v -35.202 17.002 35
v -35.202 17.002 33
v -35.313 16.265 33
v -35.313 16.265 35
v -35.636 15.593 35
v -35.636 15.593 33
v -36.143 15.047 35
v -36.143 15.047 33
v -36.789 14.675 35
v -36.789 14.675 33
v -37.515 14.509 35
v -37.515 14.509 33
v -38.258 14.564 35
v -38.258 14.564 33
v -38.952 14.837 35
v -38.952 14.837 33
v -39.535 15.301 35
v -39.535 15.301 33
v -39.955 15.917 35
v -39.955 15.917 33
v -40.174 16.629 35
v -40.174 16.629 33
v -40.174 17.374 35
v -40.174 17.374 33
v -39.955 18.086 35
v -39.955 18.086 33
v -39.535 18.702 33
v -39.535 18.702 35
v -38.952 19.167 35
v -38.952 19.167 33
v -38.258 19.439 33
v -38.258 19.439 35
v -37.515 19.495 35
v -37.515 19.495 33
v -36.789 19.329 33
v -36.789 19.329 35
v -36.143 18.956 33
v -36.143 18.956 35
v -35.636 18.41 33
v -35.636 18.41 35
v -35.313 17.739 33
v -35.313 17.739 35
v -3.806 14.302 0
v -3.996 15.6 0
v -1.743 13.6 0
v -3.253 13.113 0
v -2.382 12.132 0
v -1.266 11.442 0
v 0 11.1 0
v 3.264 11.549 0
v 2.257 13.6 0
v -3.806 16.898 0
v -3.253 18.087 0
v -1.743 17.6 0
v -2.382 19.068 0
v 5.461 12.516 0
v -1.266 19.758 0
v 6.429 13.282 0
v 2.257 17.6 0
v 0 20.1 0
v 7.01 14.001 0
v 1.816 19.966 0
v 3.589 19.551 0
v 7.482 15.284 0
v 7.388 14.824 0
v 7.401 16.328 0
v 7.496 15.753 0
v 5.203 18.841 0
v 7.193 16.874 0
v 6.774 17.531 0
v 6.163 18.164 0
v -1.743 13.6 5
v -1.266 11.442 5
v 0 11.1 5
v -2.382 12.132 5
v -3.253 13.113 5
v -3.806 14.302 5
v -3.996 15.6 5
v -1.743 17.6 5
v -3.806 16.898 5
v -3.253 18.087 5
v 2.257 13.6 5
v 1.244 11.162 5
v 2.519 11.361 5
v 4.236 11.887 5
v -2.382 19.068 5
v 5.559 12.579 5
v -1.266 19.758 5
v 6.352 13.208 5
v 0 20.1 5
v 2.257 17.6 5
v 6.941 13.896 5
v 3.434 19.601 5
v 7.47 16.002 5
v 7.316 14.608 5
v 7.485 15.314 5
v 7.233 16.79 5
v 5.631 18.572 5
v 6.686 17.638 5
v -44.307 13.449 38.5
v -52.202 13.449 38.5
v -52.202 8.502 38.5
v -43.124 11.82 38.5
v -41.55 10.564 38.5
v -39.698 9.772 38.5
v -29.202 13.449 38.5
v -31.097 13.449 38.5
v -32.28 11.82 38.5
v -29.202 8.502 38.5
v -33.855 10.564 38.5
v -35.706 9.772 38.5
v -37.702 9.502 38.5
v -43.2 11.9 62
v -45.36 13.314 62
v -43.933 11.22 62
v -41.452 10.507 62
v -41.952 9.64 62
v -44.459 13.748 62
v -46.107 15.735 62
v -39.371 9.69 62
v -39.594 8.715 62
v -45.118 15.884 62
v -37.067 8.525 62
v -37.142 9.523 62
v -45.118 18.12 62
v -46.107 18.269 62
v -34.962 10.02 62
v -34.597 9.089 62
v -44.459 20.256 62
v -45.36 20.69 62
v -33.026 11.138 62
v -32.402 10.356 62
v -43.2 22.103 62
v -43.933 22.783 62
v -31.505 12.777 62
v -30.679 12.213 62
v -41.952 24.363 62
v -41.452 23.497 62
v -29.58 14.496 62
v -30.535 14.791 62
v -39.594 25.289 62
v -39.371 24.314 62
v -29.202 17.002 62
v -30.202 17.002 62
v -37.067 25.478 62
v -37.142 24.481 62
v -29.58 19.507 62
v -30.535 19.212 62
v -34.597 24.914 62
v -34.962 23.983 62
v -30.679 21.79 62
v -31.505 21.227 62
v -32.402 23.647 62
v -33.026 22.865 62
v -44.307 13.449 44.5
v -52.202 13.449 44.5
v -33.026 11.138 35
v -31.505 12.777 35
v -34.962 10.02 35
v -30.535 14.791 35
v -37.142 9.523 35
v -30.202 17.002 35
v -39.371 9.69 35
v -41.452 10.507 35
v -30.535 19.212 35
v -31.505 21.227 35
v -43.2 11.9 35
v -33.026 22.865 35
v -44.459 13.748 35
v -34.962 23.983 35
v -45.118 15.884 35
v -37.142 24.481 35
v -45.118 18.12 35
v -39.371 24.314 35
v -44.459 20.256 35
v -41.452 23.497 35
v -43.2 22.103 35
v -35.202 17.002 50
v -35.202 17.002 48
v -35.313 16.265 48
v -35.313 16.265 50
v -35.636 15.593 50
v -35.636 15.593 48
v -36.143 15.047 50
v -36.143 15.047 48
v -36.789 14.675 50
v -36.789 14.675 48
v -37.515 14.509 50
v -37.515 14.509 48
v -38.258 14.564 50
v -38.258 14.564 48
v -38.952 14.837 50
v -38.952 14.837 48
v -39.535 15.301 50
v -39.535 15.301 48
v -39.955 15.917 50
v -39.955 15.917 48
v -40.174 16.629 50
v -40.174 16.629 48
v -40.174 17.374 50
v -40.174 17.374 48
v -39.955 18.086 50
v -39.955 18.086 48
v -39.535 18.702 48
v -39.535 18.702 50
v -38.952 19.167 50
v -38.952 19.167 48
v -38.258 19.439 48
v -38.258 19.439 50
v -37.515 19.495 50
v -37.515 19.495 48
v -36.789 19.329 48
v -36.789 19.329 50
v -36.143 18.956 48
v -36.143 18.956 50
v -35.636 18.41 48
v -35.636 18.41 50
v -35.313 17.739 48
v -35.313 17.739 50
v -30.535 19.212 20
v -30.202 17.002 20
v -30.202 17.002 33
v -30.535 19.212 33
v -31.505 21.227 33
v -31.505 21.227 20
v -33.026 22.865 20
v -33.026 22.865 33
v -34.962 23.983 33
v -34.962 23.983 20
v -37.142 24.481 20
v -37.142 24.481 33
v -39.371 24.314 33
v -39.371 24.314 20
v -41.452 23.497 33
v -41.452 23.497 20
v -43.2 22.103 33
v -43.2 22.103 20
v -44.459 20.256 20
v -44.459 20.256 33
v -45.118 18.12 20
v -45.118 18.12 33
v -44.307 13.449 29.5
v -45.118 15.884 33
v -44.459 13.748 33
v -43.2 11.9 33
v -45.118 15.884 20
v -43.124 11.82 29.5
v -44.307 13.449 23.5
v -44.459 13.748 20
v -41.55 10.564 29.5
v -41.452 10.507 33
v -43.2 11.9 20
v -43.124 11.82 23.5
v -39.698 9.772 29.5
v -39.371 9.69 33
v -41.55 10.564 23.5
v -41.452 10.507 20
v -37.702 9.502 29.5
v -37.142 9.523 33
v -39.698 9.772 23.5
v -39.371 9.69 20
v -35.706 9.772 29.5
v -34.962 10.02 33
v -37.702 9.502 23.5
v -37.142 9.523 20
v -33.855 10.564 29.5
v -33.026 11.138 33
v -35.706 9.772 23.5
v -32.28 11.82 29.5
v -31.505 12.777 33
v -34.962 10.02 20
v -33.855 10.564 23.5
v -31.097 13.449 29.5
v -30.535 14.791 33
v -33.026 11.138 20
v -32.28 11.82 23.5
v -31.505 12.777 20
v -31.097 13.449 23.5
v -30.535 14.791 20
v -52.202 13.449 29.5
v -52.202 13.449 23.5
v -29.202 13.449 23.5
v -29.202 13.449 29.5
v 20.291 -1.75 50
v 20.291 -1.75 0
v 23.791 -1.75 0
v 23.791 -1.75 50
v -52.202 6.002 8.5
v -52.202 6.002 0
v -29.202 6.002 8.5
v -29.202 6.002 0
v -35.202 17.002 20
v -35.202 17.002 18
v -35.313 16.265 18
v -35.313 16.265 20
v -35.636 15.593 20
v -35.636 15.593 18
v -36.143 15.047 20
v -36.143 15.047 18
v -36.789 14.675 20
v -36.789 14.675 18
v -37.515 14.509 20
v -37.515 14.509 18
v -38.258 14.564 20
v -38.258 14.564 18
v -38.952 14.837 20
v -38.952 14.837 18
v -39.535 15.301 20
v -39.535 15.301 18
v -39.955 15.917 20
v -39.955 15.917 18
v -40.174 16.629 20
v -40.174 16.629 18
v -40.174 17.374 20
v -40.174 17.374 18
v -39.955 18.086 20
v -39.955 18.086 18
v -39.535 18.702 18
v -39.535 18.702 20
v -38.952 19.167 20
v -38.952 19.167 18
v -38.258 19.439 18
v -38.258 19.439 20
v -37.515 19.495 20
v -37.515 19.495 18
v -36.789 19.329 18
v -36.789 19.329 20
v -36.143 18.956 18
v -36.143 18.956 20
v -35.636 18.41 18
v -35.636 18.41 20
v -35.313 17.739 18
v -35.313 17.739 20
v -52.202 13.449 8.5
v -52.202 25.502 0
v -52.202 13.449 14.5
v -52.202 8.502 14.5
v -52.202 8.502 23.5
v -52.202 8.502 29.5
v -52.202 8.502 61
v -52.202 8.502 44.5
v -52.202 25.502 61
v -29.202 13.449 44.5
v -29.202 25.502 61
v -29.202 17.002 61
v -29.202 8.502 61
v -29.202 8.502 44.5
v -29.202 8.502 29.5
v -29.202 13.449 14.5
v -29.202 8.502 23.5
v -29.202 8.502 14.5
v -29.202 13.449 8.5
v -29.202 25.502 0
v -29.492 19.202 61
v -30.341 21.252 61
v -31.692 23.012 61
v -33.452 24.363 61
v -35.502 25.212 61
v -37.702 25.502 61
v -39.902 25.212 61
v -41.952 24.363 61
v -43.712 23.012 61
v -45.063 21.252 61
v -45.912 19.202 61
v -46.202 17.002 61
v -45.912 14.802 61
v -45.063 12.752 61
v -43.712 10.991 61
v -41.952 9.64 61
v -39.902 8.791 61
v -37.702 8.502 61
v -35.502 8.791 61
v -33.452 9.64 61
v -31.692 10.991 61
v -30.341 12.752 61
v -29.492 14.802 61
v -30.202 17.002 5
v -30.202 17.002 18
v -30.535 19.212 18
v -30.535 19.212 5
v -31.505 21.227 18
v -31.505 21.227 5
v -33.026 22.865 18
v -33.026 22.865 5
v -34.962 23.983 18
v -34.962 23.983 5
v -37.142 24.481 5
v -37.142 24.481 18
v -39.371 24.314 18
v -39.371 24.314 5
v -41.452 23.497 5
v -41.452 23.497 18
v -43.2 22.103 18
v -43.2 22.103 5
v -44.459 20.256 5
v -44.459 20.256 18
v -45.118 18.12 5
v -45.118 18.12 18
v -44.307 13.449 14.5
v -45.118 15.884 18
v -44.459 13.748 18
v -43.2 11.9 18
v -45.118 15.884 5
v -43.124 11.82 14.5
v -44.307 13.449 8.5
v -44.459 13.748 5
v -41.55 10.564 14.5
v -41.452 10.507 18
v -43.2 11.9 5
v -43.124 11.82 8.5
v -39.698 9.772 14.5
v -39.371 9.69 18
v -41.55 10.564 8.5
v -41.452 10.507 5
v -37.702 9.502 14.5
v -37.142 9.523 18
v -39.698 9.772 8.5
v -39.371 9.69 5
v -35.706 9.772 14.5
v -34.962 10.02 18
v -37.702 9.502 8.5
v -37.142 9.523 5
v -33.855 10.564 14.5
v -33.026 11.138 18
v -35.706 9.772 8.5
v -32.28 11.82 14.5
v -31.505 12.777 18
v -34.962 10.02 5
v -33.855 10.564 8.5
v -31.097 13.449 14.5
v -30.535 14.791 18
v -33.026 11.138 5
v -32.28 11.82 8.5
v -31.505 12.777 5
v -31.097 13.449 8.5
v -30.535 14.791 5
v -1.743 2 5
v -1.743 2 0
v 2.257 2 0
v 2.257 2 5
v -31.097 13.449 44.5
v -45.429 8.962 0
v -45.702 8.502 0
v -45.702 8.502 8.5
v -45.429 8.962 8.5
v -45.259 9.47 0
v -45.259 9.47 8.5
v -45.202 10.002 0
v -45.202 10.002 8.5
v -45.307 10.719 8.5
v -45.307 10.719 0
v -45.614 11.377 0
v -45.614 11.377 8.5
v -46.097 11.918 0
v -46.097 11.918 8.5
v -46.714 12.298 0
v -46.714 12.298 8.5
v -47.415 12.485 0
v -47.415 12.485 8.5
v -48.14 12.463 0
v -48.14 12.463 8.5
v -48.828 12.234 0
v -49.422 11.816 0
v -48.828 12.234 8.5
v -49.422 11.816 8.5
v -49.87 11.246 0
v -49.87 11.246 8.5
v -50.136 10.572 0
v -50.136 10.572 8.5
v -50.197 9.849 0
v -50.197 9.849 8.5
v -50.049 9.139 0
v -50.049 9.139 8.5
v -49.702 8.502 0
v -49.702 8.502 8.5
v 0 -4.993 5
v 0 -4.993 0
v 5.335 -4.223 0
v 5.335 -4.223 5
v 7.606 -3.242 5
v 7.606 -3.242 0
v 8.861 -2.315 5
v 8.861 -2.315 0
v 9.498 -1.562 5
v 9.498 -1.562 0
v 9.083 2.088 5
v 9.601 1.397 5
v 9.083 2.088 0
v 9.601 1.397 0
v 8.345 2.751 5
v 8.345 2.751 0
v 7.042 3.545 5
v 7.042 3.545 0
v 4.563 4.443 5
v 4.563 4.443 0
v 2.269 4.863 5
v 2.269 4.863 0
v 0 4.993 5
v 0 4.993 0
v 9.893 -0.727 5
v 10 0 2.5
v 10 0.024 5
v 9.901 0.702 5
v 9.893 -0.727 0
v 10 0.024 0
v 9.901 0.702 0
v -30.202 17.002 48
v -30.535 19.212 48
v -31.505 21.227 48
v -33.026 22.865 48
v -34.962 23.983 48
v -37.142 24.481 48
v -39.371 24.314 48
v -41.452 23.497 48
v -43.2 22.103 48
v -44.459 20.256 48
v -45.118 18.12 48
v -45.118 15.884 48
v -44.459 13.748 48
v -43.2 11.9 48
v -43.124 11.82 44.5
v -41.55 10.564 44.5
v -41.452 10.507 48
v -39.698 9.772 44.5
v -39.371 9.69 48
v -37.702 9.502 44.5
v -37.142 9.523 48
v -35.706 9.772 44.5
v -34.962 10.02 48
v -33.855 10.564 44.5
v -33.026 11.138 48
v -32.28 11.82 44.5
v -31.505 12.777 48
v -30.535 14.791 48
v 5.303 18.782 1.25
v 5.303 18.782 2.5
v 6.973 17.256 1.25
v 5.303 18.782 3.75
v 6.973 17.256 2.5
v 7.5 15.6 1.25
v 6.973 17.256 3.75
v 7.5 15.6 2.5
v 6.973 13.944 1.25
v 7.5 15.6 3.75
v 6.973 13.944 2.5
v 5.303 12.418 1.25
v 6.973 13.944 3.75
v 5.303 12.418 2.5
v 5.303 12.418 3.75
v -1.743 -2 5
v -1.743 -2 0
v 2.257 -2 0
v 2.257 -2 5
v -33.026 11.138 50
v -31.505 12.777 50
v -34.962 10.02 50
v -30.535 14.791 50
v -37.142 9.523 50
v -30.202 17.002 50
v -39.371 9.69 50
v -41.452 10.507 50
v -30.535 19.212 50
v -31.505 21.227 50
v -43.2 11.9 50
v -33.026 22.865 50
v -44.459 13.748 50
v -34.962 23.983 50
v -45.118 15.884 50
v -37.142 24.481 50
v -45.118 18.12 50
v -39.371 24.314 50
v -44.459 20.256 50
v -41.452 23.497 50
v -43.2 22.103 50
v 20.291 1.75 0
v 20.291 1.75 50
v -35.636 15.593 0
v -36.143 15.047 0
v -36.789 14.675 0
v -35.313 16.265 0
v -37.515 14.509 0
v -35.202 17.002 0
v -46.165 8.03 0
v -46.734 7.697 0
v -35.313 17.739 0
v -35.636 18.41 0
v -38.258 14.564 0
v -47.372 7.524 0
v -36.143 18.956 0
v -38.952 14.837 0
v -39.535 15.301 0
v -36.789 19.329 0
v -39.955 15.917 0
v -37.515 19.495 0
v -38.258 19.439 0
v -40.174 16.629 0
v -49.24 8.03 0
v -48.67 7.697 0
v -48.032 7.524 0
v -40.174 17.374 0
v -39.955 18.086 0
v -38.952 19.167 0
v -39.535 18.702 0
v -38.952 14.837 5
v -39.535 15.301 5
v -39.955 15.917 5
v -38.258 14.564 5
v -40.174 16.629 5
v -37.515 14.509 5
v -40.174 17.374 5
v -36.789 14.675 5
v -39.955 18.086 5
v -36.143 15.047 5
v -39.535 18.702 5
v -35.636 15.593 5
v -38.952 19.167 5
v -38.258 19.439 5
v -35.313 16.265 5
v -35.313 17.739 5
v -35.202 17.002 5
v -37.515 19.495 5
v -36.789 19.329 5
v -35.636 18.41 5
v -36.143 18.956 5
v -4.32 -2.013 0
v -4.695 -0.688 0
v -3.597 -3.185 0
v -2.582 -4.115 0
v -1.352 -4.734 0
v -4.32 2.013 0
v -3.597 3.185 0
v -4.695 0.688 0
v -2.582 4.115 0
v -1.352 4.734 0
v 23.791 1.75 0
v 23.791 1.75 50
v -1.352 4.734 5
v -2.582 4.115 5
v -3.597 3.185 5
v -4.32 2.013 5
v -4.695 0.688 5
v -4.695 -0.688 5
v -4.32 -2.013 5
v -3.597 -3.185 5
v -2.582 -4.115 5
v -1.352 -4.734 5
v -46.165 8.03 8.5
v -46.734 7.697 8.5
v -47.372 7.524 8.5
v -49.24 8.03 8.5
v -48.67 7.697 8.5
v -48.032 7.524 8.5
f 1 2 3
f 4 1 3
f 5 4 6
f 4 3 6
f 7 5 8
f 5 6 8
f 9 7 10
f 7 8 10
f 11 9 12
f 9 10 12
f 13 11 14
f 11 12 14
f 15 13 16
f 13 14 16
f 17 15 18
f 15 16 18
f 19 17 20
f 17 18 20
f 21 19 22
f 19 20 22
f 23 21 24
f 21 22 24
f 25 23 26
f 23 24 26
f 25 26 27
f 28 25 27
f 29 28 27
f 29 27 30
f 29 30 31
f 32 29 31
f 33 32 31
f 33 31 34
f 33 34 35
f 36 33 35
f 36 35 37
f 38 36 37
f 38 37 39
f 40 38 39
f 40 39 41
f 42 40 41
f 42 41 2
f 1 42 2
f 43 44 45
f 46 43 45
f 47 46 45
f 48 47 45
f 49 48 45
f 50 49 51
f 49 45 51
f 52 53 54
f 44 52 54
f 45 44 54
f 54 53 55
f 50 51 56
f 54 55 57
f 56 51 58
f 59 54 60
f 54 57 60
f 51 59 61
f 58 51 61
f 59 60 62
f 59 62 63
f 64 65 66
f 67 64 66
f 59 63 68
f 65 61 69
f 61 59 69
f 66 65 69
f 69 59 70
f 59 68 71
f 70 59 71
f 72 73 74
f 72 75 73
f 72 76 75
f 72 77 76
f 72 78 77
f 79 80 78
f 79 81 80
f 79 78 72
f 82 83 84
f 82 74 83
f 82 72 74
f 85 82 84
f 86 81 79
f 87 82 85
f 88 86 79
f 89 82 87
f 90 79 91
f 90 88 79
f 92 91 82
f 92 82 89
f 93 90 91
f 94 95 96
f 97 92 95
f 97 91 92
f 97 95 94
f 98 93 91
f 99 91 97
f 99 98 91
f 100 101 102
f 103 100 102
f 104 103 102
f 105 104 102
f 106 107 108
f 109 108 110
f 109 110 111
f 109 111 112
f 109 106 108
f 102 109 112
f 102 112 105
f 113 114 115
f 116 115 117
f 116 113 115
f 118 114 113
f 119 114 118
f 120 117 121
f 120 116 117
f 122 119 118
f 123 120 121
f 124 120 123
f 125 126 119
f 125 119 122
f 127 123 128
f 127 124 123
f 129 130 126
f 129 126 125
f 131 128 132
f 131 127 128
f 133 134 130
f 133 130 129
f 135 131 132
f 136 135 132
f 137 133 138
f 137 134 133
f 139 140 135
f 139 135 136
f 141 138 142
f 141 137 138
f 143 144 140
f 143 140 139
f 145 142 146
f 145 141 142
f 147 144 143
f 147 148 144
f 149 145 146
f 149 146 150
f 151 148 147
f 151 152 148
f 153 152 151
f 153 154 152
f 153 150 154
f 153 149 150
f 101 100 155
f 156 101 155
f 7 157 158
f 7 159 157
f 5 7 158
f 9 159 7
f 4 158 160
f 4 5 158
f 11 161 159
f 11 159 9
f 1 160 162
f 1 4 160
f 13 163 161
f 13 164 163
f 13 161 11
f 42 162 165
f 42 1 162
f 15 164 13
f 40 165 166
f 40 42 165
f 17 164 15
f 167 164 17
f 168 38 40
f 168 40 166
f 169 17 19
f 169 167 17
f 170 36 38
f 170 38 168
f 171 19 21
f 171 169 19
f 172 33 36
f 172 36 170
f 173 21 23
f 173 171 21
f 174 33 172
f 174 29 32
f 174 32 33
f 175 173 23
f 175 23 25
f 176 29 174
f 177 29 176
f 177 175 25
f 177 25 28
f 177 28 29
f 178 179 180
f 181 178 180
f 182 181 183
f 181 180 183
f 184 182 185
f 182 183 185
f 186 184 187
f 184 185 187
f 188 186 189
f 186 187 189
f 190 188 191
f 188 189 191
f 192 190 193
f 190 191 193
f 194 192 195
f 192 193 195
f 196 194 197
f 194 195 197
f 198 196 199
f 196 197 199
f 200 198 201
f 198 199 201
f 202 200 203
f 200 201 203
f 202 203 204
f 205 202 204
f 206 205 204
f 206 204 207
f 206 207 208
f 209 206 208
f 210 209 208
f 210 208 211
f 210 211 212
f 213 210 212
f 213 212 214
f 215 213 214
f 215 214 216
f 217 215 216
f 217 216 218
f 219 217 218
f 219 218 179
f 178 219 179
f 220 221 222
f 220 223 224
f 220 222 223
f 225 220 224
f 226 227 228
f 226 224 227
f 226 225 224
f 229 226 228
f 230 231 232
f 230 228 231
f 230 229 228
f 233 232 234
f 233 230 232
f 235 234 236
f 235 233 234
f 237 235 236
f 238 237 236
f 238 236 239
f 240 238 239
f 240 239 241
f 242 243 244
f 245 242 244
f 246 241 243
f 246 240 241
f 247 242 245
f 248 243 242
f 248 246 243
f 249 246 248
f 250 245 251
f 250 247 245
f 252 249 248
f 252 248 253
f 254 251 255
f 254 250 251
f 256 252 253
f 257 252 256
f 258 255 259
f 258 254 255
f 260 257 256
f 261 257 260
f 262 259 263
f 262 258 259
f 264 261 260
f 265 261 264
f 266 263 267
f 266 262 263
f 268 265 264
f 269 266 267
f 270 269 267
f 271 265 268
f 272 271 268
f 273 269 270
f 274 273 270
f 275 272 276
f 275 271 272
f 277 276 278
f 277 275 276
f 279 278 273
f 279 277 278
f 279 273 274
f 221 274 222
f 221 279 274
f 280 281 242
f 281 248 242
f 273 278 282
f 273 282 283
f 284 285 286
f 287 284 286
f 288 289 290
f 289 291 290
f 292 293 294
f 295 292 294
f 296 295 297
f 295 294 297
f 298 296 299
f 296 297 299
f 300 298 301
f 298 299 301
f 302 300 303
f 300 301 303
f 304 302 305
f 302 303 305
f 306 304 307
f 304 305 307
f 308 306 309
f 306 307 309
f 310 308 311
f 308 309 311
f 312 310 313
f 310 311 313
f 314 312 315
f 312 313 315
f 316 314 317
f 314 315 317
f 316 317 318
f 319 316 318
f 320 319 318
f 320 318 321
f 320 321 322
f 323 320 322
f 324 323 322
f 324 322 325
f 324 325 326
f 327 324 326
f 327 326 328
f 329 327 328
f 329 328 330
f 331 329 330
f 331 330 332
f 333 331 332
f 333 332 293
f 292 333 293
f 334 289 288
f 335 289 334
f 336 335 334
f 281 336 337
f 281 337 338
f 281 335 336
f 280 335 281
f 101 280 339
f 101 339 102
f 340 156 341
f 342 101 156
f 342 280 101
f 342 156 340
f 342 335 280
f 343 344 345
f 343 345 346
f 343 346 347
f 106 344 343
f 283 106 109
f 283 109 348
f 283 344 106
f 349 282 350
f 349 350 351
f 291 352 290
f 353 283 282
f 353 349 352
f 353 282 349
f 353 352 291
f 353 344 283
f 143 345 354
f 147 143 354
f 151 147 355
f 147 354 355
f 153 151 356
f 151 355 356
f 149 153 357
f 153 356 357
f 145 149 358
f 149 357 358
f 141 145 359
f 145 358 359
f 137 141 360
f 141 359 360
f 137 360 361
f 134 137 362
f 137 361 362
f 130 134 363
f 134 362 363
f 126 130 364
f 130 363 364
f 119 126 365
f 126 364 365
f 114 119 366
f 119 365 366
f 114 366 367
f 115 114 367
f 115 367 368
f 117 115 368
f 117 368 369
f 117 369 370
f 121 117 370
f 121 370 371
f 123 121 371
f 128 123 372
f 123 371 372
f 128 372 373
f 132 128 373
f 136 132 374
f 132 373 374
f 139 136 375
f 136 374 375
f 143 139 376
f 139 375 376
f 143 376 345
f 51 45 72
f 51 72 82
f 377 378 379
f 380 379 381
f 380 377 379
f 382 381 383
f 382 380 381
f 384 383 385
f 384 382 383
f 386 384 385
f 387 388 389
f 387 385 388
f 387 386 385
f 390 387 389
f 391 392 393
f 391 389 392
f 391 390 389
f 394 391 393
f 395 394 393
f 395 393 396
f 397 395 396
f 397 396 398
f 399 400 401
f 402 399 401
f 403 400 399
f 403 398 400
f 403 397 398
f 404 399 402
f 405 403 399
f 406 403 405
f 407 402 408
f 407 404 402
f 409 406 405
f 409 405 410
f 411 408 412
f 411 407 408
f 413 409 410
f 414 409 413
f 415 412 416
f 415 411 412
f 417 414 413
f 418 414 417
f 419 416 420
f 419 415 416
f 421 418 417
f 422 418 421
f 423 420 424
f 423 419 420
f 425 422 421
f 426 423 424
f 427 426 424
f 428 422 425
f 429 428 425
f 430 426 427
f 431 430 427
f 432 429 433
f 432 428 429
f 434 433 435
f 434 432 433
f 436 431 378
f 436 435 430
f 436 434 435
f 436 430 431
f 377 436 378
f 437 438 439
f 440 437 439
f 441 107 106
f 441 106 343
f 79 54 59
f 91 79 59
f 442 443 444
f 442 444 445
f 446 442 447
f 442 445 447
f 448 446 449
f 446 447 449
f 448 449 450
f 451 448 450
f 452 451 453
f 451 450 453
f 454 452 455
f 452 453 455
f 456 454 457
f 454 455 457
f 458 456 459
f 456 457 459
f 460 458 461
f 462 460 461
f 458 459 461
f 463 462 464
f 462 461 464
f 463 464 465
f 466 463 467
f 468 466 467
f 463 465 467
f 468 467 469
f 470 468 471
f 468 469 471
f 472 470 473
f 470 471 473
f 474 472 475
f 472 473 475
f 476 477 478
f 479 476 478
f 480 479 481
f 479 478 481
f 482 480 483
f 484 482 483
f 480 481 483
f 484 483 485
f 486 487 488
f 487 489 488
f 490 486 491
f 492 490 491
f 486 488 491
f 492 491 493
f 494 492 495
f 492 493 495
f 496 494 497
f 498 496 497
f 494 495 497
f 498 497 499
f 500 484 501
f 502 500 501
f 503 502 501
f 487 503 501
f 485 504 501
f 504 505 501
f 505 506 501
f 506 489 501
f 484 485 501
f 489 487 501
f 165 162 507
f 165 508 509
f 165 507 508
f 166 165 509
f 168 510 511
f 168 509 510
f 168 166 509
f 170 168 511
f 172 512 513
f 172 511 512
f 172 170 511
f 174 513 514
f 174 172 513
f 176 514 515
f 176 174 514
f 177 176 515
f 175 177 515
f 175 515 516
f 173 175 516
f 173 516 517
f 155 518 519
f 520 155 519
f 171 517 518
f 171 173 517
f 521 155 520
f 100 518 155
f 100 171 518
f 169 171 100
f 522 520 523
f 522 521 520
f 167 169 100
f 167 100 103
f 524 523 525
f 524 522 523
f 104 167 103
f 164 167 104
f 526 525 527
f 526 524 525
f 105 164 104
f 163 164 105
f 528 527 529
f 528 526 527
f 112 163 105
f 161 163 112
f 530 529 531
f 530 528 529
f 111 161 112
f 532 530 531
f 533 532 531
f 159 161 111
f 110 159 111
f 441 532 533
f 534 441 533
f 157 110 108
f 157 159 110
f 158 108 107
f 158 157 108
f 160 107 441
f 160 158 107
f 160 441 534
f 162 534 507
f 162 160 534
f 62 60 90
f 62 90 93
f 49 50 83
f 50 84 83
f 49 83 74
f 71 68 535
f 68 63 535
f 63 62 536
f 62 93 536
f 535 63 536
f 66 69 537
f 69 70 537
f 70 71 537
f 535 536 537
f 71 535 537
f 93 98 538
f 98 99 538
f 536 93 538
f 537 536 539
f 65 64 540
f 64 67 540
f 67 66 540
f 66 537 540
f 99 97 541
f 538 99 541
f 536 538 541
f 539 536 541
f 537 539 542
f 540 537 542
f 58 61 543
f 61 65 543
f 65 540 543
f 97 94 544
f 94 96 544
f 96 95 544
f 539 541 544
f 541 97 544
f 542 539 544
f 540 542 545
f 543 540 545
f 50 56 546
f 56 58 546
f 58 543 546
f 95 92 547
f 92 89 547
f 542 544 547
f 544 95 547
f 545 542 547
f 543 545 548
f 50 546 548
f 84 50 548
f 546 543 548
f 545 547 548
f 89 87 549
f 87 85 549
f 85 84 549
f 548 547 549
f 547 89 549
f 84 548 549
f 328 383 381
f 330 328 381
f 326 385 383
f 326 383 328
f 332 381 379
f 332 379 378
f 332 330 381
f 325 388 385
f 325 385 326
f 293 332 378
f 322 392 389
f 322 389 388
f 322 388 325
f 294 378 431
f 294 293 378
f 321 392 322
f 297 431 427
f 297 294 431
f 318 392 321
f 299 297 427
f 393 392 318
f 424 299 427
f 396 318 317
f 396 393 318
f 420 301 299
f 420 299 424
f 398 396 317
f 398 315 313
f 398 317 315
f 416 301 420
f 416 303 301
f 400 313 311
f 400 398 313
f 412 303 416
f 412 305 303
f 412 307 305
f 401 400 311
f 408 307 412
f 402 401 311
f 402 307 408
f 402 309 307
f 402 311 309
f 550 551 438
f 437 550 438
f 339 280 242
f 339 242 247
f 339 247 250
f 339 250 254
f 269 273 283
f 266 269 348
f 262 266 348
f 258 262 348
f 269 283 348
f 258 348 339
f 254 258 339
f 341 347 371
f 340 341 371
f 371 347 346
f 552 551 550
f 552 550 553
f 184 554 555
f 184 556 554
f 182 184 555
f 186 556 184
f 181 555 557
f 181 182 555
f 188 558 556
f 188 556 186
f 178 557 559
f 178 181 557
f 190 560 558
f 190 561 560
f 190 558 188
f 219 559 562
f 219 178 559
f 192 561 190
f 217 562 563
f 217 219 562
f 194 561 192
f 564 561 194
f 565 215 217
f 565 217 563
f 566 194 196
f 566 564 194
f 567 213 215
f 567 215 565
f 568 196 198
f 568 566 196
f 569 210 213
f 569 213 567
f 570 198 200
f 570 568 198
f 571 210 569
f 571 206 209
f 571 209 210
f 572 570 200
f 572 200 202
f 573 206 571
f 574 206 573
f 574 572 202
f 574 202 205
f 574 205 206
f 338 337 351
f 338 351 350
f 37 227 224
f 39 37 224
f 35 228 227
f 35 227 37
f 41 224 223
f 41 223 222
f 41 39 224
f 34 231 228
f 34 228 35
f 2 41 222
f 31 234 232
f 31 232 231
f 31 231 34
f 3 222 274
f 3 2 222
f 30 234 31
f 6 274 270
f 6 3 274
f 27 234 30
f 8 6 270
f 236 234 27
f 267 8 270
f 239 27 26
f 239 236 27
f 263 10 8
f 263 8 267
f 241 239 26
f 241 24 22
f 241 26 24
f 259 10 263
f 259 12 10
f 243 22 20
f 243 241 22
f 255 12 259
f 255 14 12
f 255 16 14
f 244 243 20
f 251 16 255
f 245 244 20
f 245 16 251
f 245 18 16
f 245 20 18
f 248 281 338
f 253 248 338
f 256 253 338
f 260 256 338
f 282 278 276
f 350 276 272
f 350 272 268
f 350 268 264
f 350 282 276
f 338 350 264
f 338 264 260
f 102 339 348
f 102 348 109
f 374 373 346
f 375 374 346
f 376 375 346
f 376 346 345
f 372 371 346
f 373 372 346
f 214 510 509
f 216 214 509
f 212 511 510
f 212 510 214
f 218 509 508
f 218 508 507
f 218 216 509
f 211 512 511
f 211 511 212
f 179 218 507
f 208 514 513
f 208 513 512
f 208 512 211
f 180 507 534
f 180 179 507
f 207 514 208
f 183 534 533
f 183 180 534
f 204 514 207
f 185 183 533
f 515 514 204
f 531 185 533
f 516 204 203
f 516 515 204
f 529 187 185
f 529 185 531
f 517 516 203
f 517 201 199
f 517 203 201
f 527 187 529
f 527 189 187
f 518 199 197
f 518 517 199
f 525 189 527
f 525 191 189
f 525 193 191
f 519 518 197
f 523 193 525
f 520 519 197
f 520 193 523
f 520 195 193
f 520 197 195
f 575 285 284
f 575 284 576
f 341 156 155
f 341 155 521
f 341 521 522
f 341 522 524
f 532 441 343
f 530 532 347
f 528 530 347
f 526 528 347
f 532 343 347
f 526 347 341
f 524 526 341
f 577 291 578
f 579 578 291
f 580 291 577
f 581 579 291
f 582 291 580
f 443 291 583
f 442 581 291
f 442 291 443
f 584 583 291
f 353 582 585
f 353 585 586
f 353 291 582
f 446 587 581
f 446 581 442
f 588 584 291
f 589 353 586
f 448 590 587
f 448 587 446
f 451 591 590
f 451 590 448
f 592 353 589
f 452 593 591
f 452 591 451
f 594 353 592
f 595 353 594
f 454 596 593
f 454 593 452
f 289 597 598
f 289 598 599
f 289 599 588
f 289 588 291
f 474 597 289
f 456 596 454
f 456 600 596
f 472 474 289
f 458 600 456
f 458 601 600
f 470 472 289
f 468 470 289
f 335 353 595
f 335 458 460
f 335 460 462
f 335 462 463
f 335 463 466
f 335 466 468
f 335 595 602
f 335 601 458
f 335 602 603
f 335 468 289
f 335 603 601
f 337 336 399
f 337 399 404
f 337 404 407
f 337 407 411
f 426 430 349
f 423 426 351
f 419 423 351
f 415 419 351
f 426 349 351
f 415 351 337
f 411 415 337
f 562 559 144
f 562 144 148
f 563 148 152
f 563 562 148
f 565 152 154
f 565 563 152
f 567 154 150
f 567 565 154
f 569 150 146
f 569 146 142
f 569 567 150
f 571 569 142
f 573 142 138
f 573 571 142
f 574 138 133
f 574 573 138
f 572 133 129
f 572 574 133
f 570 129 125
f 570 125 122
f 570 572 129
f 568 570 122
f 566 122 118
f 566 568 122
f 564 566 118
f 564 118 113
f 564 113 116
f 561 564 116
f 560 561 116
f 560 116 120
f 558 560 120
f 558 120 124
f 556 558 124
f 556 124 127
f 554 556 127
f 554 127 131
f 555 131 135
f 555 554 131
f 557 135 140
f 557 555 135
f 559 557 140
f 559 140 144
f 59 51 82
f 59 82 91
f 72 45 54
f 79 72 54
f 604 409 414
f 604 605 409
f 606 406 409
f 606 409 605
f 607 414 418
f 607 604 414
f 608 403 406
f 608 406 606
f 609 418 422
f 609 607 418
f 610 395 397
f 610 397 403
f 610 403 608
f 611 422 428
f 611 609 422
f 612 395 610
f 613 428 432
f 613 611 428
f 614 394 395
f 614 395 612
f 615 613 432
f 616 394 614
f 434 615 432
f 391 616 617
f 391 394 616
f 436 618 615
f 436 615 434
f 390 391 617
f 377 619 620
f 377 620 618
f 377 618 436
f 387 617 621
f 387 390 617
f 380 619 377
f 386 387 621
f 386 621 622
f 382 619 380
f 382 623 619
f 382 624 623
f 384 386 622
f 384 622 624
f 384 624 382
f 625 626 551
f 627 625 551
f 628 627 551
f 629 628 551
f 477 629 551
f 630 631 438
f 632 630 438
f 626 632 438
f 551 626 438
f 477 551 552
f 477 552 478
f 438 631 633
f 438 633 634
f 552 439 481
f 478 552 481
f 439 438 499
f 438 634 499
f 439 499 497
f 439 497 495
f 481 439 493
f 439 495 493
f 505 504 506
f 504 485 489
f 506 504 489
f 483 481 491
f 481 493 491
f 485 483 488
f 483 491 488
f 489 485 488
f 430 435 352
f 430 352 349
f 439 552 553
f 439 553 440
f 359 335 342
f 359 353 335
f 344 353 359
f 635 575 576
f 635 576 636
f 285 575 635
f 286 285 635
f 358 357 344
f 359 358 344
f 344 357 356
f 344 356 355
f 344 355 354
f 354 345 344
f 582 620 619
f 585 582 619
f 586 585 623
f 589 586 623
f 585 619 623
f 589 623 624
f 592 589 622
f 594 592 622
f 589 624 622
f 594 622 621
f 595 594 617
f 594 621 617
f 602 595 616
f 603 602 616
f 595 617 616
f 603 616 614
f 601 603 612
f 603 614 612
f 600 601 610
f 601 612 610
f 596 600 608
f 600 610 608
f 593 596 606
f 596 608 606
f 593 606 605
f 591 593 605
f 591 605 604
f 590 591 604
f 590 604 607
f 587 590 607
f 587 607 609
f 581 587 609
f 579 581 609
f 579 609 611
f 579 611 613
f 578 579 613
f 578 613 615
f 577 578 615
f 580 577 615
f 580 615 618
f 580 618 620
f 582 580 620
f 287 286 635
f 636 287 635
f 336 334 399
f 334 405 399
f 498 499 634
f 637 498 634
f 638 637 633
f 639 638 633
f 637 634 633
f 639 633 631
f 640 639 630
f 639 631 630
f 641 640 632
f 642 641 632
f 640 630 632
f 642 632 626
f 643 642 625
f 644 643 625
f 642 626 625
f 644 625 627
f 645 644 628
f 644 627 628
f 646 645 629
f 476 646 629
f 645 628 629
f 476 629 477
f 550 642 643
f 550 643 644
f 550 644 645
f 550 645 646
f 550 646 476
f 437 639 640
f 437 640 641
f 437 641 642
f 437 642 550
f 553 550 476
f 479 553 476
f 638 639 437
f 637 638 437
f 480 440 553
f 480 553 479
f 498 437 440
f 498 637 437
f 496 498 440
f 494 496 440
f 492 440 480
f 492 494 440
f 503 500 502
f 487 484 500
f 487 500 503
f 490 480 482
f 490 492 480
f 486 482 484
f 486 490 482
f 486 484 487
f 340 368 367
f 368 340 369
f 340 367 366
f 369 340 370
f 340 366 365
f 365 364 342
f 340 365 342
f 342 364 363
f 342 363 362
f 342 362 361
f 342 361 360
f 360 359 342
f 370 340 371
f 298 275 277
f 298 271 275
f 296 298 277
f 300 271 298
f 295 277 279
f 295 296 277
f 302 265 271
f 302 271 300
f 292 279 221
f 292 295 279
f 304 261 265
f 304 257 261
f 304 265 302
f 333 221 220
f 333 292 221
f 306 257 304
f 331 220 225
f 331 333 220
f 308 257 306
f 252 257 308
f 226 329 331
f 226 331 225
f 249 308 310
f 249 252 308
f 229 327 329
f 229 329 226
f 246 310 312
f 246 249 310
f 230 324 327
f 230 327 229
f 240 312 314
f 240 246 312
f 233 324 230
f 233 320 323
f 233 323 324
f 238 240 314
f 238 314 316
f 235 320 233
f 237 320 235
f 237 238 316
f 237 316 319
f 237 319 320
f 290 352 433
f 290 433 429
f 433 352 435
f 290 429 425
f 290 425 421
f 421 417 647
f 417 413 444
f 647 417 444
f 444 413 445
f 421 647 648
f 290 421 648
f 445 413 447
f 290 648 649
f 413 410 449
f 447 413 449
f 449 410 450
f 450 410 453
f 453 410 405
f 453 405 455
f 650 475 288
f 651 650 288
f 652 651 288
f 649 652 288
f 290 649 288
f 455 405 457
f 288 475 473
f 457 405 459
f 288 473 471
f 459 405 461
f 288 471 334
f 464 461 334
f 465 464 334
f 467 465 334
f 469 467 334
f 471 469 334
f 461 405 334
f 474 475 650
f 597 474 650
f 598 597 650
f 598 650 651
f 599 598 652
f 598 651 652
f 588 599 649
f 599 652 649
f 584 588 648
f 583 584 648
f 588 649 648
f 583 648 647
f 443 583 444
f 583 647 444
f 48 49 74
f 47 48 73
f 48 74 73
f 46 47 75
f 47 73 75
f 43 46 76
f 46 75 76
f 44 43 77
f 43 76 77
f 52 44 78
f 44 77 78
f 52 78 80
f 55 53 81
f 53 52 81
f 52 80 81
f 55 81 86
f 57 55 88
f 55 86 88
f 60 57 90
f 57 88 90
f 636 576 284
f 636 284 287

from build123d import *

# Parameters (mm, degrees)
F0_W           = 4
F0_H           = 4
F1_DEPTH       = 5
F2_W           = 3.5
F2_H           = 3.5
F3_DEPTH       = 50
F6_DEPTH       = 25
F7_R           = 7.5
F8_DEPTH       = 5
F9_R           = 2.5
F10_DEPTH      = 5.0010001
F10_DEPTH_BACK = 45.001
F11_R          = 8.5
F11_R_2        = 7.5
F12_DEPTH      = 7
F12_DEPTH_BACK = 5
F14_DEPTH      = 11
F16_DEPTH      = 50
F17_DEPTH      = 50
F19_DEPTH      = 17
F18_W          = 4.9475478008
F18_H          = 6
F20_DEPTH      = 25
F21_R          = 2.5
F22_DEPTH      = 62.001
F24_W          = 40.9381370991
F24_H          = 29.6913962811
F24_W_2        = 36.4394430071
F24_H_2        = 22.0436118543
F25_DEPTH      = 25
F26_DEPTH      = 5
F28_DEPTH      = 6
F30_DEPTH      = 2.5
F31_DEPTH      = 8.5010001


with BuildPart() as f1:
    # F0 (on Top) → F1 (new body)
    with BuildSketch(Plane.XY):
        with BuildLine():
            ThreePointArc((0, 4.9933729626), (-4.742654986, 0), (0, -4.9933729626))
            add(Edge.make_bspline(
                [(0, -4.9933729626), (10, -4.9933729626), (10, 0), (10, 4.9933729626), (0, 4.9933729626)],
                knots=[4.7123889804, 4.7123889804, 4.7123889804, 6.2831853072, 6.2831853072, 7.853981634, 7.853981634, 7.853981634], degree=2, weights=[1, 0.7071067812, 1, 0.7071067812, 1]))
        make_face()
        with Locations((0.257345014, 0)):
            Rectangle(F0_W, F0_H, mode=Mode.SUBTRACT)
    extrude(amount=F1_DEPTH)


with BuildPart() as f3:
    # F2 (on Top) → F3 (new body)
    with BuildSketch(Plane.XY):
        with Locations((22.040861788, 0)):
            Rectangle(F2_W, F2_H)
    extrude(amount=F3_DEPTH)


with BuildPart() as f4_1:
    # F4: copy of F1
    add(f1.part.moved(Location((0, 15.6, 0))))

    # F5 (on face) → F6 (cut)
    with BuildSketch(Plane.XY.offset(5)):
        with BuildLine():
            add(Edge.make_bspline(
                [(0, 11.1), (10, 11.1), (10, 15.6)],
                knots=[4.7123889804, 4.7123889804, 4.7123889804, 6.2831853072, 6.2831853072, 6.2831853072], degree=2, weights=[1, 0.7071067812, 1]))
            add(Edge.make_bspline(
                [(10, 15.6), (10, 20.1), (0, 20.1)],
                knots=[0, 0, 0, 1.5707963268, 1.5707963268, 1.5707963268], degree=2, weights=[1, 0.7071067812, 1]))
            add(Edge.make_bspline(
                [(0, 11.1), (7.5, 11.1), (7.5, 15.6), (7.5, 20.1), (0, 20.1)],
                knots=[4.7123889804, 4.7123889804, 4.7123889804, 6.2831853072, 6.2831853072, 7.853981634, 7.853981634, 7.853981634], degree=2, weights=[1, 0.7071067812, 1, 0.7071067812, 1]))
        make_face()
        with BuildLine():
            add(Edge.make_bspline(
                [(10, 15.6), (10, 20.1), (0, 20.1)],
                knots=[0, 0, 0, 1.5707963268, 1.5707963268, 1.5707963268], degree=2, weights=[1, 0.7071067812, 1]))
            add(Edge.make_bspline(
                [(10, 15.6), (10, 20.5933729626), (0, 20.5933729626)],
                knots=[6.2831853072, 6.2831853072, 6.2831853072, 7.853981634, 7.853981634, 7.853981634], degree=2, weights=[1, 0.7071067812, 1]))
            ThreePointArc((0, 20.5933729626), (-1.0943150122, 20.4138358066), (-2.1221413846, 19.9975043466))
            add(Edge.make_bspline(
                [(0, 20.1), (-1.0732937978, 20.1), (-2.1221413846, 19.9975043466)],
                knots=[1.5707963268, 1.5707963268, 1.5707963268, 1.7846364763, 1.7846364763, 1.7846364763], degree=2, weights=[1, 0.9942894921, 1]))
        make_face()
        with BuildLine():
            add(Edge.make_bspline(
                [(0, 10.6066270374), (10, 10.6066270374), (10, 15.6)],
                knots=[4.7123889804, 4.7123889804, 4.7123889804, 6.2831853072, 6.2831853072, 6.2831853072], degree=2, weights=[1, 0.7071067812, 1]))
            add(Edge.make_bspline(
                [(0, 11.1), (10, 11.1), (10, 15.6)],
                knots=[4.7123889804, 4.7123889804, 4.7123889804, 6.2831853072, 6.2831853072, 6.2831853072], degree=2, weights=[1, 0.7071067812, 1]))
            add(Edge.make_bspline(
                [(-2.1221413846, 11.2024956534), (-1.0732937978, 11.1), (0, 11.1)],
                knots=[4.4985488309, 4.4985488309, 4.4985488309, 4.7123889804, 4.7123889804, 4.7123889804], degree=2, weights=[1, 0.9942894921, 1]))
            ThreePointArc((-2.1221413846, 11.2024956534), (-1.0943150122, 10.7861641934), (0, 10.6066270374))
        make_face()
        with BuildLine():
            ThreePointArc((0, 11.1), (-3.9959013346, 15.6), (0, 20.1))
            add(Edge.make_bspline(
                [(0, 20.1), (-1.0732937978, 20.1), (-2.1221413846, 19.9975043466)],
                knots=[1.5707963268, 1.5707963268, 1.5707963268, 1.7846364763, 1.7846364763, 1.7846364763], degree=2, weights=[1, 0.9942894921, 1]))
            ThreePointArc((-2.1221413846, 19.9975043466), (-4.742654986, 15.6), (-2.1221413846, 11.2024956534))
            add(Edge.make_bspline(
                [(-2.1221413846, 11.2024956534), (-1.0732937978, 11.1), (0, 11.1)],
                knots=[4.4985488309, 4.4985488309, 4.4985488309, 4.7123889804, 4.7123889804, 4.7123889804], degree=2, weights=[1, 0.9942894921, 1]))
        make_face()
    extrude(amount=-F6_DEPTH, mode=Mode.SUBTRACT)


with BuildPart() as f8:
    # F7 (on Top) → F8 (new body)
    with BuildSketch(Plane.XY):
        with Locations((-37.7020835876, 17.0017145574)):
            Circle(F7_R)
    extrude(amount=F8_DEPTH)

    # F9 (on face) → F10 (cut, two sides)
    with BuildSketch(Plane.XY.offset(5)) as f10_sk:
        with Locations((-37.7020835876, 17.0017145574)):
            Circle(F9_R)
    extrude(amount=-F10_DEPTH, mode=Mode.SUBTRACT)
    extrude(f10_sk.sketch, amount=F10_DEPTH_BACK, mode=Mode.SUBTRACT)

    # F11 (on face) → F12 (join, two sides)
    with BuildSketch(Plane.XY.offset(5)) as f12_sk:
        with Locations((-37.7020835876, 17.0017145574)):
            Circle(F11_R)
        with Locations((-37.7020835876, 17.0017145574)):
            Circle(F11_R_2, mode=Mode.SUBTRACT)
    extrude(amount=F12_DEPTH)
    extrude(f12_sk.sketch, amount=-F12_DEPTH_BACK)

    # F13 (on face) → F14 (join)
    with BuildSketch(Plane(origin=(0, 0, 0), x_dir=(1, 0, 0), z_dir=(0, 0, -1))):
        with BuildLine():
            Line((-37.7020835876, -25.5017145574), (-29.2020835876, -25.5017145574))
            Line((-29.2020835876, -25.5017145574), (-29.2020835876, -17.0017145574))
            ThreePointArc((-29.2020835876, -17.0017145574), (-31.6916759476, -23.0121221975), (-37.7020835876, -25.5017145574))
        make_face()
        with BuildLine():
            Line((-46.2020835876, -25.5017145574), (-37.7020835876, -25.5017145574))
            ThreePointArc((-37.7020835876, -25.5017145574), (-43.7124912277, -23.0121221975), (-46.2020835876, -17.0017145574))
            Line((-46.2020835876, -17.0017145574), (-46.2020835876, -25.5017145574))
        make_face()
        with BuildLine():
            ThreePointArc((-37.7020835876, -8.5017145574), (-31.6916759476, -10.9913069173), (-29.2020835876, -17.0017145574))
            Line((-29.2020835876, -17.0017145574), (-29.2020835876, -8.5017145574))
            Line((-29.2020835876, -8.5017145574), (-37.7020835876, -8.5017145574))
        make_face()
        with BuildLine():
            Line((-46.2020835876, -8.5017145574), (-46.2020835876, -17.0017145574))
            ThreePointArc((-46.2020835876, -17.0017145574), (-43.7124912277, -10.9913069173), (-37.7020835876, -8.5017145574))
            Line((-37.7020835876, -8.5017145574), (-46.2020835876, -8.5017145574))
        make_face()
    extrude(amount=-F14_DEPTH)

    # F16 (add): a face of the model
    f16_faces = [f8.faces().sort_by_distance(p)[0] for p in [
        (-45.961667282, 17.0017145574, 12),
    ]]
    extrude(f16_faces, amount=F16_DEPTH)

    # F17 (add): faces of the model
    f17_faces = [f8.faces().sort_by_distance(p)[0] for p in [
        (-44.3034561066, 23.6030870764, 11),
        (-44.3034561066, 10.4003420384, 11),
        (-31.1007110687, 10.4003420384, 11),
        (-31.1007110687, 23.6030870764, 11),
    ]]
    extrude(f17_faces, amount=F17_DEPTH)

    # F18 (on face) → F19 (join)
    with BuildSketch(Plane(origin=(-46.2020835876, 0, 0), x_dir=(0, -1, 0), z_dir=(-1, 0, 0))):
        Polygon((-13.4492623582, 18), (-8.5017145574, 18), (-8.5017145574, 20), (-13.4492623582, 20), (-25.5017145574, 20), (-25.5017145574, 18), align=None)
        Polygon((-13.4492623582, 48), (-8.5017145574, 48), (-8.5017145574, 50), (-25.5017145574, 50), (-25.5017145574, 48), align=None)
        Polygon((-13.4492623582, 33), (-8.5017145574, 33), (-8.5017145574, 35), (-13.4492623582, 35), (-25.5017145574, 35), (-25.5017145574, 33), align=None)
    extrude(amount=-F19_DEPTH)

    # F18 (on face) → F20 (cut)
    with BuildSketch(Plane(origin=(-46.2020835876, 0, 0), x_dir=(0, -1, 0), z_dir=(-1, 0, 0))):
        with Locations((-10.9754884578, 41.5)):
            Rectangle(F18_W, F18_H)
        with Locations((-10.9754884578, 26.5)):
            Rectangle(F18_W, F18_H)
        with Locations((-10.9754884578, 11.5)):
            Rectangle(F18_W, F18_H)
    extrude(amount=-F20_DEPTH, mode=Mode.SUBTRACT)

    # F21 (on face) → F22 (cut, through all)
    with BuildSketch(Plane(origin=(0, 0, 0), x_dir=(1, 0, 0), z_dir=(0, 0, -1))):
        with Locations((-37.7020835876, -17.0017145574)):
            Circle(F21_R)
    extrude(amount=-F22_DEPTH, mode=Mode.SUBTRACT)


with BuildPart() as f23_1:
    # F23: copy of F8
    add(f8.part.moved(Location((0, 0, -75))))

    # F24 (on face) → F25 (cut)
    with BuildSketch(Plane.XZ.offset(-8.5017145574)):
        with Locations((-40.3531985357, -23.1816293672)):
            Rectangle(F24_W, F24_H)
        with Locations((-38.1038514897, -68.3935303241)):
            Rectangle(F24_W_2, F24_H_2)
    extrude(amount=-F25_DEPTH, mode=Mode.SUBTRACT)

    # F26 (add): a face of the model
    f26_faces = [f23_1.faces().sort_by_distance(p)[0] for p in [
        (-46.2020835876, 17.5996708125, -47.6200983876),
    ]]
    extrude(f26_faces, amount=F26_DEPTH)


with BuildPart() as f8_1:
    add(f8.part)

    # F28 (add): a face of the model
    f28_faces = [f8_1.faces().sort_by_distance(p)[0] for p in [
        (-46.2020835876, 17.5678563035, 30.8757852671),
    ]]
    extrude(f28_faces, amount=F28_DEPTH)

    # F30 (add): a face of the model
    f30_faces = [f8_1.faces().sort_by_distance(p)[0] for p in [
        (-40.7020835876, 8.5017145574, 4.25),
    ]]
    extrude(f30_faces, amount=F30_DEPTH)

    # F29 (on face) → F31 (cut, through all)
    with BuildSketch(Plane.XY.offset(8.5)):
        with BuildLine():
            ThreePointArc((-45.7020835876, 8.5017145574), (-45.3303753425, 9.2111451424), (-45.2020835876, 10.0017145574))
            ThreePointArc((-45.2020835876, 10.0017145574), (-48.4926530027, 12.3734228025), (-49.7020835876, 8.5017145574))
            Line((-49.7020835876, 8.5017145574), (-45.7020835876, 8.5017145574))
        make_face()
        with BuildLine():
            Line((-45.7020835876, 8.5017145574), (-49.7020835876, 8.5017145574))
            ThreePointArc((-49.7020835876, 8.5017145574), (-47.7020835876, 7.5017145574), (-45.7020835876, 8.5017145574))
        make_face()
    extrude(amount=-F31_DEPTH, mode=Mode.SUBTRACT)


solid = Compound([f1.part, f3.part, f4_1.part, f8_1.part])
